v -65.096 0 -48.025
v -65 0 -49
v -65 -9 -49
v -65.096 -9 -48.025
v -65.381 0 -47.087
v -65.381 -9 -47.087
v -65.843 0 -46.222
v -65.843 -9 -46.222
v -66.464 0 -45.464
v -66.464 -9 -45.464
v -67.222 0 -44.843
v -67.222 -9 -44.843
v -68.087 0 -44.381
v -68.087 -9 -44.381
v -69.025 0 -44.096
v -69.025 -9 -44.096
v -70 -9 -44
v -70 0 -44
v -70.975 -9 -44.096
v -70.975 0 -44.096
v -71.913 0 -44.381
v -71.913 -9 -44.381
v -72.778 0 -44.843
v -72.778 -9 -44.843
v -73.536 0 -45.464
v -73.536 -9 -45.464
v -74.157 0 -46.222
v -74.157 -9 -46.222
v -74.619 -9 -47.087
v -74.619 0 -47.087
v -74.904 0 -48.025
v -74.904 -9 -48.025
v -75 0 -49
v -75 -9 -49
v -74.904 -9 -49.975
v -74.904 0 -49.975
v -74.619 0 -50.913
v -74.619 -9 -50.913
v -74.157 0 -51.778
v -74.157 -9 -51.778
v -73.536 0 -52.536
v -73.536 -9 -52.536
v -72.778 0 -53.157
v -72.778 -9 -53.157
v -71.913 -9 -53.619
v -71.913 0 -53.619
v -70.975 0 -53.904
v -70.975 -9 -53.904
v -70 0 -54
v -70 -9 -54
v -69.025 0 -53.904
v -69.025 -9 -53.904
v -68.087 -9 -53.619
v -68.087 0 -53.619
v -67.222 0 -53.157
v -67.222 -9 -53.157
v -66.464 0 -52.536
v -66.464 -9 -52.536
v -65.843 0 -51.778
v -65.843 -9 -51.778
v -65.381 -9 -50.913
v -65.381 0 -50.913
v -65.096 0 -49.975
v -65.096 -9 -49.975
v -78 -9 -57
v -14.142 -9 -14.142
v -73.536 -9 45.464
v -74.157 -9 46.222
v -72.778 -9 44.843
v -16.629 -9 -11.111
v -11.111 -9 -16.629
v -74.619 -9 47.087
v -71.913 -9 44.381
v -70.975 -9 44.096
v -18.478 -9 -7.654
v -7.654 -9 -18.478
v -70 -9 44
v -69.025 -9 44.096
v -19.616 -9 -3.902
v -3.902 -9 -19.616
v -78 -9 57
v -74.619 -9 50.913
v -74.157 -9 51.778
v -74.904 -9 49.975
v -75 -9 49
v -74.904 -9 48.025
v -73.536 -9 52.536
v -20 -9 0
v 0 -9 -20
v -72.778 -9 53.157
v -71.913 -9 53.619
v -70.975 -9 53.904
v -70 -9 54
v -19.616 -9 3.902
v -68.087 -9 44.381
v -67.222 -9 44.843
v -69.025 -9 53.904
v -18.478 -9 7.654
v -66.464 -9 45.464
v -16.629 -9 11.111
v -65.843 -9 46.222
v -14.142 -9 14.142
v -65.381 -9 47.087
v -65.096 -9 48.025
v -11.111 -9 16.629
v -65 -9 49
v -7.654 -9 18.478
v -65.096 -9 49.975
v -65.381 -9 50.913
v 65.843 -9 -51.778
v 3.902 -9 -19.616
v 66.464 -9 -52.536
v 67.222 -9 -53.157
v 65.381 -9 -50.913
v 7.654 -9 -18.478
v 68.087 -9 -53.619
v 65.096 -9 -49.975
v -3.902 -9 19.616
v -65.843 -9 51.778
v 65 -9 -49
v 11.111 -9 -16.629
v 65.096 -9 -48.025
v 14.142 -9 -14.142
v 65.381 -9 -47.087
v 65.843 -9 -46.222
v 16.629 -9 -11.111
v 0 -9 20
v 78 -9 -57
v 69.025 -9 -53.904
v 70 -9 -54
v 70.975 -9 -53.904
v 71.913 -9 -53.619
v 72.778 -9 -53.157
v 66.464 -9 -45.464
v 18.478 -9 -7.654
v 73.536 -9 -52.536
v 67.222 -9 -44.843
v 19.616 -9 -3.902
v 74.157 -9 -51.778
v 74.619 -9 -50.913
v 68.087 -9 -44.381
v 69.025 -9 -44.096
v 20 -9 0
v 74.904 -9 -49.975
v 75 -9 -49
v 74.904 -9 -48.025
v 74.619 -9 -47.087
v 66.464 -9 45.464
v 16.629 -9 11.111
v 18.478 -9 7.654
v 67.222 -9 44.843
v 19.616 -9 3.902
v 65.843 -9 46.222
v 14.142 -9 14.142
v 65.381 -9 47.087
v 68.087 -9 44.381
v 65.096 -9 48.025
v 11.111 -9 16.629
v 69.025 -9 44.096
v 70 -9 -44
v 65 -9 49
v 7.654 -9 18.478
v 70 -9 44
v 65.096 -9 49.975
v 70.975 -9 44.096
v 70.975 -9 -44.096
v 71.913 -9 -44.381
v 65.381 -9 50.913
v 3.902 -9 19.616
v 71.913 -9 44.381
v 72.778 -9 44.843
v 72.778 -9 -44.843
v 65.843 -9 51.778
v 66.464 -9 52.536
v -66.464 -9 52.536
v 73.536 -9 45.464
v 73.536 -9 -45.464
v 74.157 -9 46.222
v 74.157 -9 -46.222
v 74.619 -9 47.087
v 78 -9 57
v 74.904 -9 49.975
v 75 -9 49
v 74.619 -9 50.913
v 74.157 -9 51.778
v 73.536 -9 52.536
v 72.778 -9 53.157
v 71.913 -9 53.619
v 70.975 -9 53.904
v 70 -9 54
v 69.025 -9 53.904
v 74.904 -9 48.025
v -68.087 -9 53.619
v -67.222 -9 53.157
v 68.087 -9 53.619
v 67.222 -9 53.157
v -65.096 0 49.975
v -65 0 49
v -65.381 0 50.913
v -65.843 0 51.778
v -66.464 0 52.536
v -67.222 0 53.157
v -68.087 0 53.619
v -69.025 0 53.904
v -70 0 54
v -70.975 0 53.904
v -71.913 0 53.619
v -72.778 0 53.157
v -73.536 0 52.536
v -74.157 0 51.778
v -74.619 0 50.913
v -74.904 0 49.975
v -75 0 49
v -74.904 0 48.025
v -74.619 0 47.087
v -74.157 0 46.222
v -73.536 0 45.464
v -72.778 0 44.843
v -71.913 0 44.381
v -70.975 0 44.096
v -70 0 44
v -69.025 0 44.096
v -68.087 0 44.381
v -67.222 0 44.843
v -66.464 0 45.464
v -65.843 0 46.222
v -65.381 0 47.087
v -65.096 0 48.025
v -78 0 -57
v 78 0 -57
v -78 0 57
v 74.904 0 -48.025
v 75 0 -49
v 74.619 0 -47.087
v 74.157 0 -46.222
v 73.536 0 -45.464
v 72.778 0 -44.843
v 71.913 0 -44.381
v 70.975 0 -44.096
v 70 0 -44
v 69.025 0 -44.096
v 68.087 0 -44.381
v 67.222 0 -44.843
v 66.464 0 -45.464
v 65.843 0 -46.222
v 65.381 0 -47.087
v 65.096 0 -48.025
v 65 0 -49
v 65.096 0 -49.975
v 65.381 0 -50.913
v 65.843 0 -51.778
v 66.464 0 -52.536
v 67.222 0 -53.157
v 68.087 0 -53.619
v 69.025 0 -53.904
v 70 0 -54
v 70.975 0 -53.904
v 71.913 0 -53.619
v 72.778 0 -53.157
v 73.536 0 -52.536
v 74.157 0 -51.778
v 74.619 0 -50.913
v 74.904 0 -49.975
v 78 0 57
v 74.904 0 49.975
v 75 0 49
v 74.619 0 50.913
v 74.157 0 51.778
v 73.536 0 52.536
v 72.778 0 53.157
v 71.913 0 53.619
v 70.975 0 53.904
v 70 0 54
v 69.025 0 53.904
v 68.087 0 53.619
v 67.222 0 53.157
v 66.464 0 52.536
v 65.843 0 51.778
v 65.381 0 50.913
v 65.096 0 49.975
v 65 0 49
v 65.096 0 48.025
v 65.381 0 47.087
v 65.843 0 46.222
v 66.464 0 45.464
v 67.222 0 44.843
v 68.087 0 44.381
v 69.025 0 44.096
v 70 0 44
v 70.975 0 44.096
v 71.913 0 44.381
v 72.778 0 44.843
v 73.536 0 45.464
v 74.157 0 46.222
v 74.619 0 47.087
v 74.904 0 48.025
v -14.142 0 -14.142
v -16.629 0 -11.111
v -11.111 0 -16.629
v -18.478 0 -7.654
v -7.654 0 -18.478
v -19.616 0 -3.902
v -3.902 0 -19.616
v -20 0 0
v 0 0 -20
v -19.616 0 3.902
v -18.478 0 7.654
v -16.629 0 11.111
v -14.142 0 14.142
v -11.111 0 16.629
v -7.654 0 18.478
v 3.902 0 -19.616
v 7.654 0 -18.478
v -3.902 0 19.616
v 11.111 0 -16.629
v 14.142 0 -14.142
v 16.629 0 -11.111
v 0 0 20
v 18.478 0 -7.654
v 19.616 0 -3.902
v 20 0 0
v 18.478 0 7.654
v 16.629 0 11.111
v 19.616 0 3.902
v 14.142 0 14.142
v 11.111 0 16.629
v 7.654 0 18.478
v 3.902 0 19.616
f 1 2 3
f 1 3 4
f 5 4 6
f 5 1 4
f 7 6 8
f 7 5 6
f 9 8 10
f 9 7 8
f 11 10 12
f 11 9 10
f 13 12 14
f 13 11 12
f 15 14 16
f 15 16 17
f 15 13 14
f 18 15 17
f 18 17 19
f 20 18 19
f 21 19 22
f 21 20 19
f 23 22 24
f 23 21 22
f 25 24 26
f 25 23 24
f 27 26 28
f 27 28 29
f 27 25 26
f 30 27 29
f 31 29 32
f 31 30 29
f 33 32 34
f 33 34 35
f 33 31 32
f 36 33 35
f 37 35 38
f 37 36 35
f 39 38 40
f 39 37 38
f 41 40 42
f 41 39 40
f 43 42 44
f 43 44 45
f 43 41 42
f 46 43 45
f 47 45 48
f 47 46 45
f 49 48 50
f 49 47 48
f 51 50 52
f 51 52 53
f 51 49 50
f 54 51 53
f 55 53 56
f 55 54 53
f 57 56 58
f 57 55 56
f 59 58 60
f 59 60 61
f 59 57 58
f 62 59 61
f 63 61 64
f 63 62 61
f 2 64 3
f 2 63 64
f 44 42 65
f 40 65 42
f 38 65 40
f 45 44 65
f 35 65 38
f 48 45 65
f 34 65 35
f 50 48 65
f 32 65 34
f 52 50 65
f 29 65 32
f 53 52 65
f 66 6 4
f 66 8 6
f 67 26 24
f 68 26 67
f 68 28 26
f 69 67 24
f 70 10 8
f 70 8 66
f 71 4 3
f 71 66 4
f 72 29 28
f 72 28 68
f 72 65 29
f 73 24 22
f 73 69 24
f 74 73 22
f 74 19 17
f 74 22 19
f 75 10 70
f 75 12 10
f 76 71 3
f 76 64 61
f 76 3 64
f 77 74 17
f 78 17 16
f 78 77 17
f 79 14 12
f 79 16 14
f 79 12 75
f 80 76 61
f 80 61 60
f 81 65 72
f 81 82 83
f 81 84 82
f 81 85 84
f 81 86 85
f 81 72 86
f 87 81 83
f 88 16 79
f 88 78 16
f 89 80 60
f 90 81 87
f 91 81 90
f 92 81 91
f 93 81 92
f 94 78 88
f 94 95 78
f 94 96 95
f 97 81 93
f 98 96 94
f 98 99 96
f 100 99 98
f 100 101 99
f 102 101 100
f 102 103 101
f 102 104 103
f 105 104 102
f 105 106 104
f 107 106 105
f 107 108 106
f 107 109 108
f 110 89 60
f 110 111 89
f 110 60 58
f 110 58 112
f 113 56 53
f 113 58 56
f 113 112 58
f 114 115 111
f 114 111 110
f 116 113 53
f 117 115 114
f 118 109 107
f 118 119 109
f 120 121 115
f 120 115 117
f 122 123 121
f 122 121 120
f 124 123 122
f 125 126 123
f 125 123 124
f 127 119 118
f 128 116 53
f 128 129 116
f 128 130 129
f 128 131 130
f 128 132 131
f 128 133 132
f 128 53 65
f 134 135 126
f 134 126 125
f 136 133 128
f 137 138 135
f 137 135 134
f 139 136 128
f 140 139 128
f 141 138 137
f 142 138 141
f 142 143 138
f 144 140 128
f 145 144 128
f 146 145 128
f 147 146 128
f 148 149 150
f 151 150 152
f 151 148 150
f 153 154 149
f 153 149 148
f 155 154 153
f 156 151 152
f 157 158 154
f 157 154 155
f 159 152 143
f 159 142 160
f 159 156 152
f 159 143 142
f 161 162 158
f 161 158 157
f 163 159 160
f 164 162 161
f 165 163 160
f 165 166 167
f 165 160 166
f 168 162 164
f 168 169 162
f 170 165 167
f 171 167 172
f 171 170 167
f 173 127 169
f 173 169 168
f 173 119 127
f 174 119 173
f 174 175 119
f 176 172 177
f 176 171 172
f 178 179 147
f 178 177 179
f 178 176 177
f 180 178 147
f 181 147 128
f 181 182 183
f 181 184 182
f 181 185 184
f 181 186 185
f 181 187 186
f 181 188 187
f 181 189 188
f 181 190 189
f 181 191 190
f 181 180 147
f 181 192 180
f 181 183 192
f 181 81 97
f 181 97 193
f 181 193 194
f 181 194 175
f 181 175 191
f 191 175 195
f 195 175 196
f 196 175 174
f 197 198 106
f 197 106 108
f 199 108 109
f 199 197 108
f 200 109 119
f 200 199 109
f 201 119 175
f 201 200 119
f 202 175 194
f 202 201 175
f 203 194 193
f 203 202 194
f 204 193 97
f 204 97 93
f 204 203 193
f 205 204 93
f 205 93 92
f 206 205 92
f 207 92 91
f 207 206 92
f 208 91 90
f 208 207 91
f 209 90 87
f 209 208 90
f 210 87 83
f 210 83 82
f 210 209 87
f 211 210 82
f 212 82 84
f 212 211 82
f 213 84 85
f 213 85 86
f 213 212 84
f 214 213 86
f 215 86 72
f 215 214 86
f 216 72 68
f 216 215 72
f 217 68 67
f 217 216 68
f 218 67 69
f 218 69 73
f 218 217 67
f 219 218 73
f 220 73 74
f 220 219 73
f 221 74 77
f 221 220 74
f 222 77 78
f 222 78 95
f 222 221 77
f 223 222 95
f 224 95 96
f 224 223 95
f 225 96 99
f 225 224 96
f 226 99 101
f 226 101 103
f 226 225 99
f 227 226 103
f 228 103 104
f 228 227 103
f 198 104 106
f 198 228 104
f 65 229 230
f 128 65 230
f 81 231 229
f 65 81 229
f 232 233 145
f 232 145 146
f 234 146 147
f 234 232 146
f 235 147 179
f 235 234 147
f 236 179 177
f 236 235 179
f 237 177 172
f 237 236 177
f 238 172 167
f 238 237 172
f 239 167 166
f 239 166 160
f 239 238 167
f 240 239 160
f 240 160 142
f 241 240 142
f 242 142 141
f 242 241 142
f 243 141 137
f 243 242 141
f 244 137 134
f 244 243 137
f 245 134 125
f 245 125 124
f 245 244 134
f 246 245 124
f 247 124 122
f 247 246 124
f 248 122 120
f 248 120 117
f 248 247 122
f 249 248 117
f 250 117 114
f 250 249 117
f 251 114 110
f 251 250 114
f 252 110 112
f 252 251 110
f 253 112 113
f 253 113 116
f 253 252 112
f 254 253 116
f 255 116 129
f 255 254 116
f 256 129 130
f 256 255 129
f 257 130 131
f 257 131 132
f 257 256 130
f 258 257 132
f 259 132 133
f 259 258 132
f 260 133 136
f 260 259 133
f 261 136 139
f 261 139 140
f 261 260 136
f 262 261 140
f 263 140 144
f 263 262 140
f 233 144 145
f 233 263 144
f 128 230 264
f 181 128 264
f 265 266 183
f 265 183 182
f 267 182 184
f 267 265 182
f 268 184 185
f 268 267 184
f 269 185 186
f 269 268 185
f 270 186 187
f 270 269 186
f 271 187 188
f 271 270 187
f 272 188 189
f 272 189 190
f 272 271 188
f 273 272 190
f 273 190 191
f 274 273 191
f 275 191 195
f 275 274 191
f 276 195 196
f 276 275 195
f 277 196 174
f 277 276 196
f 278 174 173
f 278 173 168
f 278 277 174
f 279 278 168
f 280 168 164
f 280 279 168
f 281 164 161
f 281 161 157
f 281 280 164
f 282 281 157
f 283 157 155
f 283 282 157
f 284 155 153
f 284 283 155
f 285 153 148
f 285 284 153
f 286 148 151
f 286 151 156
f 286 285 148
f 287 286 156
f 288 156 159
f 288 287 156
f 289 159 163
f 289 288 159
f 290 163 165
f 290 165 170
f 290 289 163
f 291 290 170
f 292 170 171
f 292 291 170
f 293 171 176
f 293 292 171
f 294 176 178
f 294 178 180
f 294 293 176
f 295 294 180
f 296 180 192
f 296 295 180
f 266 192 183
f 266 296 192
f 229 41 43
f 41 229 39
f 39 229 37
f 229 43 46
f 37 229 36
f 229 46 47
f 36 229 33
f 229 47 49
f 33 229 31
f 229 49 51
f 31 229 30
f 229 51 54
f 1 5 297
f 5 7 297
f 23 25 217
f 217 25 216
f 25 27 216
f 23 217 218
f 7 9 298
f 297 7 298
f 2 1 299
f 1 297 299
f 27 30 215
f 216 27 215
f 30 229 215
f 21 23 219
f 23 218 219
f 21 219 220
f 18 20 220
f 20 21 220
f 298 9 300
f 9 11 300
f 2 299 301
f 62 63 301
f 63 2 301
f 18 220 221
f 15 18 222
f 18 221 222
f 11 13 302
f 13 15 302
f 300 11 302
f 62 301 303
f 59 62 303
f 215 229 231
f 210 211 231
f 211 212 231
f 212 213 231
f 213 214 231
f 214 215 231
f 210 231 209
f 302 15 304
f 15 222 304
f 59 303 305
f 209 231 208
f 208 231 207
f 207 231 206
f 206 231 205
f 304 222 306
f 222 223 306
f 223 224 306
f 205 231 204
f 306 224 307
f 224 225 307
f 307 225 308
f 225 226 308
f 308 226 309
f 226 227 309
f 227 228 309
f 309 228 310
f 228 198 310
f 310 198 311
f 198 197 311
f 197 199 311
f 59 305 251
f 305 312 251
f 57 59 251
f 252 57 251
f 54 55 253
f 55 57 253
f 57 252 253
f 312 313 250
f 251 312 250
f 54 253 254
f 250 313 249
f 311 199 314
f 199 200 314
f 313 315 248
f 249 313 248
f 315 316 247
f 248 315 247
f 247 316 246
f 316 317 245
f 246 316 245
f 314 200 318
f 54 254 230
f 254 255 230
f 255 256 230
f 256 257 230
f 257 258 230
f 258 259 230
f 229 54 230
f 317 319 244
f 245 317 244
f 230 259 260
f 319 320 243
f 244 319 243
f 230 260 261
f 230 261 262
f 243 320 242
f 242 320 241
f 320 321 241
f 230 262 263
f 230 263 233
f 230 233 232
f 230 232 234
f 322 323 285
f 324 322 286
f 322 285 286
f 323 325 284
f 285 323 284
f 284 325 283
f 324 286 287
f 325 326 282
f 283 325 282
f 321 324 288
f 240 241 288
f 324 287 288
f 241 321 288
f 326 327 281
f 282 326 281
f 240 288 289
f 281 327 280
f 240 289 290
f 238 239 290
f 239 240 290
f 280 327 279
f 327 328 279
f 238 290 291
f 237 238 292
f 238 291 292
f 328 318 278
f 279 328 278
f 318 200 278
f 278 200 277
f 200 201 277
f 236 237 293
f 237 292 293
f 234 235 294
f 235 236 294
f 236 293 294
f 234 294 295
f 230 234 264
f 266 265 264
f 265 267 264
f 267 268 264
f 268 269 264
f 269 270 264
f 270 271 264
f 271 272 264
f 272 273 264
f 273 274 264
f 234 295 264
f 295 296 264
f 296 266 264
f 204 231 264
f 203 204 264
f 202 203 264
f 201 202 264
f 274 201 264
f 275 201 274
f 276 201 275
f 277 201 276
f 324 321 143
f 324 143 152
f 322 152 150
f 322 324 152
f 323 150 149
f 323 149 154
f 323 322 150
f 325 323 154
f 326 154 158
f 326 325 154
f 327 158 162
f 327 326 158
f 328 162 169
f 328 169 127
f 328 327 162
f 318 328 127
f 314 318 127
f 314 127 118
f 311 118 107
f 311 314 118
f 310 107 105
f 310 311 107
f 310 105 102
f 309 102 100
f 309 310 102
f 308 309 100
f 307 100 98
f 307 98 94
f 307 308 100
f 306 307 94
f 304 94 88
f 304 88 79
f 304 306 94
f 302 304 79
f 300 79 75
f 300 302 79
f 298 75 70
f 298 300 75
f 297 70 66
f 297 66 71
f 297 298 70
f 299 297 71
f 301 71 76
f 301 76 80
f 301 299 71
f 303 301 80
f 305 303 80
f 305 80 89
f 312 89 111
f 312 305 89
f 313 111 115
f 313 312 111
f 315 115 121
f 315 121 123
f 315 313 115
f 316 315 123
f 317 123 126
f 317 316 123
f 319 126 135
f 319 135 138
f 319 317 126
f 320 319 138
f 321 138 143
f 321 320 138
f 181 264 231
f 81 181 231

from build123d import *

# Parameters (mm, degrees)
F0_R     = 5
F0_R_2   = 20
F1_DEPTH = 9


with BuildPart() as f1:
    # F0 (on Front) → F1 (new body)
    with BuildSketch(Plane.XZ):
        Polygon((-78, -52), (-78, -57), (78, -57), (78, -52), (78, 52), (78, 57), (-78, 57), (-78, 52), align=None)
        with Locations((-70, -49)):
            Circle(F0_R, mode=Mode.SUBTRACT)
        with Locations((70, -49)):
            Circle(F0_R, mode=Mode.SUBTRACT)
        with Locations((-70, 49)):
            Circle(F0_R, mode=Mode.SUBTRACT)
        Circle(F0_R_2, mode=Mode.SUBTRACT)
        with Locations((70, 49)):
            Circle(F0_R, mode=Mode.SUBTRACT)
    extrude(amount=F1_DEPTH)


solid = f1.part
